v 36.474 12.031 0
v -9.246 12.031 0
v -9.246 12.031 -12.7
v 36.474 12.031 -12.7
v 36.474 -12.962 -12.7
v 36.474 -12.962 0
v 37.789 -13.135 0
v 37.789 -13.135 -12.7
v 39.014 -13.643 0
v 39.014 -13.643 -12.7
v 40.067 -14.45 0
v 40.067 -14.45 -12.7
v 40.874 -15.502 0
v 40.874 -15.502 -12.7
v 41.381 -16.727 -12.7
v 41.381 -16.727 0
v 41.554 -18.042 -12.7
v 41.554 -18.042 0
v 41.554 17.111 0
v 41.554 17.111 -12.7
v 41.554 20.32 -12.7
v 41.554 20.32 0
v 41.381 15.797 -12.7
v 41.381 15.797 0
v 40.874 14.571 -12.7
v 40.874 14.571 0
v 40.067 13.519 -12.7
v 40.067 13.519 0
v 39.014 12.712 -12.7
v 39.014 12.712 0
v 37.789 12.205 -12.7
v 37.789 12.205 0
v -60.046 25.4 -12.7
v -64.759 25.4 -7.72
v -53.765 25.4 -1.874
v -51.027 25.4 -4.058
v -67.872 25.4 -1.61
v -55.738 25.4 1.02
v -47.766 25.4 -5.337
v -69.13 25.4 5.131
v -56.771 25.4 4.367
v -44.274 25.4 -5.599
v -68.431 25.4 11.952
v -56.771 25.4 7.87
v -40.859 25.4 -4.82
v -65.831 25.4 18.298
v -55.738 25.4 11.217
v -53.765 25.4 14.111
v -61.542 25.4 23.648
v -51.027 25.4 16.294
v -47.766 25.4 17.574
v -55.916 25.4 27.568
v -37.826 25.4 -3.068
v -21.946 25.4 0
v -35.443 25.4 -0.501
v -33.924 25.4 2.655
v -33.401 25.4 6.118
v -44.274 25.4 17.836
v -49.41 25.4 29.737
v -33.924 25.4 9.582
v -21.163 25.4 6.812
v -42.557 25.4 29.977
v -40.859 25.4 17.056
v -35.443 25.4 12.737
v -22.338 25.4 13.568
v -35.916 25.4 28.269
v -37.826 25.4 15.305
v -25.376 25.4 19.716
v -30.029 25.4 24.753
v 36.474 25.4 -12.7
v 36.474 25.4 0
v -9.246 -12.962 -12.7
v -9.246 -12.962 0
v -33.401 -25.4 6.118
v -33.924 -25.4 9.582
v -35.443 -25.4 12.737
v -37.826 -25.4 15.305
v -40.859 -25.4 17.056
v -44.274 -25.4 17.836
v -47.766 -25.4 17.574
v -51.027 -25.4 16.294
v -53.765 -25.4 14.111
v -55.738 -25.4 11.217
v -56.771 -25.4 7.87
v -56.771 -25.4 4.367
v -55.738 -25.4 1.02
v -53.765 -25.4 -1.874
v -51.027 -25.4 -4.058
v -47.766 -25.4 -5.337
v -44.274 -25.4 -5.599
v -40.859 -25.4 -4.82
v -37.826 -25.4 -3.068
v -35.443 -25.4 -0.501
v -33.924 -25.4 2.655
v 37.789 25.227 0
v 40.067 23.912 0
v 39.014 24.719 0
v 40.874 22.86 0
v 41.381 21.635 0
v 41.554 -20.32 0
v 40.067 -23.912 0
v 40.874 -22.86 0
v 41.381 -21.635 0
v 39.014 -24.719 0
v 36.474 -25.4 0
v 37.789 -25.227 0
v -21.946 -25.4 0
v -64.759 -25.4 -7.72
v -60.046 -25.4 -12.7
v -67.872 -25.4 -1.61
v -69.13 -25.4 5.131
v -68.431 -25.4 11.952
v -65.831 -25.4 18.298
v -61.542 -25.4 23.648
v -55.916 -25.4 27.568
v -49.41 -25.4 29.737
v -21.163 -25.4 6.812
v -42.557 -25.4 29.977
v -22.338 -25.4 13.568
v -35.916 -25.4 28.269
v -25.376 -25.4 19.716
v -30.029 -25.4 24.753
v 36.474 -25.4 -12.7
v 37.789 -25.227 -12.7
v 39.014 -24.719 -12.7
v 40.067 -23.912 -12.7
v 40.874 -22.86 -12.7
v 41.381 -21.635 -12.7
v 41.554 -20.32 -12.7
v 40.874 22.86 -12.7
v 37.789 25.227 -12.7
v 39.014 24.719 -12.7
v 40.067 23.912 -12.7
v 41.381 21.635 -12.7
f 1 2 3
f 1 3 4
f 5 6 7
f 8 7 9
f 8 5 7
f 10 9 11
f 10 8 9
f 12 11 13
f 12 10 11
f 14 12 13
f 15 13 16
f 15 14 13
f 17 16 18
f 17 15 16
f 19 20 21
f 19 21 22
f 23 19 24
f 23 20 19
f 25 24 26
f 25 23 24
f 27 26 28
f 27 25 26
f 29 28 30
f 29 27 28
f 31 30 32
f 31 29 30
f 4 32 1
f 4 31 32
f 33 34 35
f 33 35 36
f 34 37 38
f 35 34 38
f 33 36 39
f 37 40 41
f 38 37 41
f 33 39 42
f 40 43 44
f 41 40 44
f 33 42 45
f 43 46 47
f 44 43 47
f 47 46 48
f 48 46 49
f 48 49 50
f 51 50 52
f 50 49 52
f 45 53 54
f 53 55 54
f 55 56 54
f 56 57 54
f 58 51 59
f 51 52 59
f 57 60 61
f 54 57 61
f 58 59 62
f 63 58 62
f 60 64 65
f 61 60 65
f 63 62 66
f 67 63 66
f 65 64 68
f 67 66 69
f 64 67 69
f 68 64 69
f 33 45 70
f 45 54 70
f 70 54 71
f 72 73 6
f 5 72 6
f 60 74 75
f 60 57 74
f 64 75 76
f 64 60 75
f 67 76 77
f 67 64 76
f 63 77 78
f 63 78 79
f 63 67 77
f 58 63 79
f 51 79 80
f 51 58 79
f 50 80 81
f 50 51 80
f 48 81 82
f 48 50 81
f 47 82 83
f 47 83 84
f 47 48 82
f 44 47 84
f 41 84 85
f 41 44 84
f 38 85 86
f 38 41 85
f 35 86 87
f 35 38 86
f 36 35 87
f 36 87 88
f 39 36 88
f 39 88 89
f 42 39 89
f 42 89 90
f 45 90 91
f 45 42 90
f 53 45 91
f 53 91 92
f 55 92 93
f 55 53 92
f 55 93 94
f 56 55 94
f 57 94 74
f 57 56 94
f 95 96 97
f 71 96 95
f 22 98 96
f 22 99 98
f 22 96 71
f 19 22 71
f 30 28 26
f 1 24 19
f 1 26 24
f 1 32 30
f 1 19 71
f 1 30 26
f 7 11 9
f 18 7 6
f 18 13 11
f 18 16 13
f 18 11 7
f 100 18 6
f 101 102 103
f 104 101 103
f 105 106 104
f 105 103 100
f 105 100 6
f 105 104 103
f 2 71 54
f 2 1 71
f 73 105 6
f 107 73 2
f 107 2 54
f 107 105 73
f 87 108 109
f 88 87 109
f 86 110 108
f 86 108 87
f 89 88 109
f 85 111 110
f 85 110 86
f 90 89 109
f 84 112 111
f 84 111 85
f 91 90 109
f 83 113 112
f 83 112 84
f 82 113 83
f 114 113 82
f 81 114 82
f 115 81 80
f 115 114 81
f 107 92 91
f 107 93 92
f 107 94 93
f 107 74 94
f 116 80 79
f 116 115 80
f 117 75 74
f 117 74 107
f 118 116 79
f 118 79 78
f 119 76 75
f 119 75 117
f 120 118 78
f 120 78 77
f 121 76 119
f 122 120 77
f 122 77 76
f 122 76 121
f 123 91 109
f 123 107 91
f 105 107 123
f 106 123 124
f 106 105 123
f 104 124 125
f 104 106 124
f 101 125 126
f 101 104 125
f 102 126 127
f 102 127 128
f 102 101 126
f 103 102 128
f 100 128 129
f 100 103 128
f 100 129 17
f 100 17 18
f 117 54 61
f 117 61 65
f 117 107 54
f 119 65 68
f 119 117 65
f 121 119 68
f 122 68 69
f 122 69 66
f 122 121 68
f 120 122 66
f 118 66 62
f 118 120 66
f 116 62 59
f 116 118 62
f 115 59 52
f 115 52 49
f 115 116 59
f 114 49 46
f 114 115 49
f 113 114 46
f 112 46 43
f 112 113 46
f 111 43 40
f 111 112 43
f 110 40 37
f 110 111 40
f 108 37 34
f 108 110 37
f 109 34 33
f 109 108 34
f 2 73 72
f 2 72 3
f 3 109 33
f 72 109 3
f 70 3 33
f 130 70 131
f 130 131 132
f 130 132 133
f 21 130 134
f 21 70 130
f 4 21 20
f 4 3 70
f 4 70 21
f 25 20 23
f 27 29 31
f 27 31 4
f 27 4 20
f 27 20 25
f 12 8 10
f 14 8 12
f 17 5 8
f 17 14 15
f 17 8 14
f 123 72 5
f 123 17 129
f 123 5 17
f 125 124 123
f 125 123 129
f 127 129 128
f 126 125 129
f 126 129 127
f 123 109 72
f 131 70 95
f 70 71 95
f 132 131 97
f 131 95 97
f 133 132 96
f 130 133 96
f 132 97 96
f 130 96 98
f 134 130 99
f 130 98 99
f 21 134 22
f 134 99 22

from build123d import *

# Parameters (mm, degrees)
F0_R     = 11.7502279649
F1_DEPTH = 25.4
F2_DEPTH = 25.4
F3_W     = 50.8
F3_H     = 24.9936
F4_DEPTH = 25.4
F5_R     = 5.08
F6_R     = 5.08


with BuildPart() as f1:
    # F0 (on Front) → F1 (new body)
    with BuildSketch(Plane.XZ):
        with BuildLine():
            ThreePointArc((-21.9455999374, 0), (-52.740892143, 28.8858766168), (-60.0455999374, -12.7))
            Line((-60.0455999374, -12.7), (41.5544000626, -12.7))
            Line((41.5544000626, -12.7), (41.5544000626, 0))
            Line((41.5544000626, 0), (-21.9455999374, 0))
        make_face()
        with Locations((-45.1517072222, 6.1183218543)):
            Circle(F0_R, mode=Mode.SUBTRACT)
    extrude(amount=F1_DEPTH)

    # F2 (add): a face of the model
    f2_faces = [f1.faces().sort_by_distance(p)[0] for p in [
        (-23.82283695, 0, 2.1208901059),
    ]]
    extrude(f2_faces, amount=F2_DEPTH)

    # F3 (on face) → F4 (cut)
    with BuildSketch(Plane.XY):
        with Locations((16.1544000626, -0.4653680826)):
            Rectangle(F3_W, F3_H)
    extrude(amount=-F4_DEPTH, mode=Mode.SUBTRACT)

    # F5
    f5_edges = [f1.edges().sort_by_distance(p)[0] for p in [
        (41.5544, 12.031432, -6.35),
        (41.5544, 25.4, -6.35),
    ]]
    fillet(f5_edges, radius=F5_R)

    # F6
    f6_edges = [f1.edges().sort_by_distance(p)[0] for p in [
        (41.5544, -12.962168, -6.35),
        (41.5544, -25.4, -6.35),
    ]]
    fillet(f6_edges, radius=F6_R)


solid = f1.part
